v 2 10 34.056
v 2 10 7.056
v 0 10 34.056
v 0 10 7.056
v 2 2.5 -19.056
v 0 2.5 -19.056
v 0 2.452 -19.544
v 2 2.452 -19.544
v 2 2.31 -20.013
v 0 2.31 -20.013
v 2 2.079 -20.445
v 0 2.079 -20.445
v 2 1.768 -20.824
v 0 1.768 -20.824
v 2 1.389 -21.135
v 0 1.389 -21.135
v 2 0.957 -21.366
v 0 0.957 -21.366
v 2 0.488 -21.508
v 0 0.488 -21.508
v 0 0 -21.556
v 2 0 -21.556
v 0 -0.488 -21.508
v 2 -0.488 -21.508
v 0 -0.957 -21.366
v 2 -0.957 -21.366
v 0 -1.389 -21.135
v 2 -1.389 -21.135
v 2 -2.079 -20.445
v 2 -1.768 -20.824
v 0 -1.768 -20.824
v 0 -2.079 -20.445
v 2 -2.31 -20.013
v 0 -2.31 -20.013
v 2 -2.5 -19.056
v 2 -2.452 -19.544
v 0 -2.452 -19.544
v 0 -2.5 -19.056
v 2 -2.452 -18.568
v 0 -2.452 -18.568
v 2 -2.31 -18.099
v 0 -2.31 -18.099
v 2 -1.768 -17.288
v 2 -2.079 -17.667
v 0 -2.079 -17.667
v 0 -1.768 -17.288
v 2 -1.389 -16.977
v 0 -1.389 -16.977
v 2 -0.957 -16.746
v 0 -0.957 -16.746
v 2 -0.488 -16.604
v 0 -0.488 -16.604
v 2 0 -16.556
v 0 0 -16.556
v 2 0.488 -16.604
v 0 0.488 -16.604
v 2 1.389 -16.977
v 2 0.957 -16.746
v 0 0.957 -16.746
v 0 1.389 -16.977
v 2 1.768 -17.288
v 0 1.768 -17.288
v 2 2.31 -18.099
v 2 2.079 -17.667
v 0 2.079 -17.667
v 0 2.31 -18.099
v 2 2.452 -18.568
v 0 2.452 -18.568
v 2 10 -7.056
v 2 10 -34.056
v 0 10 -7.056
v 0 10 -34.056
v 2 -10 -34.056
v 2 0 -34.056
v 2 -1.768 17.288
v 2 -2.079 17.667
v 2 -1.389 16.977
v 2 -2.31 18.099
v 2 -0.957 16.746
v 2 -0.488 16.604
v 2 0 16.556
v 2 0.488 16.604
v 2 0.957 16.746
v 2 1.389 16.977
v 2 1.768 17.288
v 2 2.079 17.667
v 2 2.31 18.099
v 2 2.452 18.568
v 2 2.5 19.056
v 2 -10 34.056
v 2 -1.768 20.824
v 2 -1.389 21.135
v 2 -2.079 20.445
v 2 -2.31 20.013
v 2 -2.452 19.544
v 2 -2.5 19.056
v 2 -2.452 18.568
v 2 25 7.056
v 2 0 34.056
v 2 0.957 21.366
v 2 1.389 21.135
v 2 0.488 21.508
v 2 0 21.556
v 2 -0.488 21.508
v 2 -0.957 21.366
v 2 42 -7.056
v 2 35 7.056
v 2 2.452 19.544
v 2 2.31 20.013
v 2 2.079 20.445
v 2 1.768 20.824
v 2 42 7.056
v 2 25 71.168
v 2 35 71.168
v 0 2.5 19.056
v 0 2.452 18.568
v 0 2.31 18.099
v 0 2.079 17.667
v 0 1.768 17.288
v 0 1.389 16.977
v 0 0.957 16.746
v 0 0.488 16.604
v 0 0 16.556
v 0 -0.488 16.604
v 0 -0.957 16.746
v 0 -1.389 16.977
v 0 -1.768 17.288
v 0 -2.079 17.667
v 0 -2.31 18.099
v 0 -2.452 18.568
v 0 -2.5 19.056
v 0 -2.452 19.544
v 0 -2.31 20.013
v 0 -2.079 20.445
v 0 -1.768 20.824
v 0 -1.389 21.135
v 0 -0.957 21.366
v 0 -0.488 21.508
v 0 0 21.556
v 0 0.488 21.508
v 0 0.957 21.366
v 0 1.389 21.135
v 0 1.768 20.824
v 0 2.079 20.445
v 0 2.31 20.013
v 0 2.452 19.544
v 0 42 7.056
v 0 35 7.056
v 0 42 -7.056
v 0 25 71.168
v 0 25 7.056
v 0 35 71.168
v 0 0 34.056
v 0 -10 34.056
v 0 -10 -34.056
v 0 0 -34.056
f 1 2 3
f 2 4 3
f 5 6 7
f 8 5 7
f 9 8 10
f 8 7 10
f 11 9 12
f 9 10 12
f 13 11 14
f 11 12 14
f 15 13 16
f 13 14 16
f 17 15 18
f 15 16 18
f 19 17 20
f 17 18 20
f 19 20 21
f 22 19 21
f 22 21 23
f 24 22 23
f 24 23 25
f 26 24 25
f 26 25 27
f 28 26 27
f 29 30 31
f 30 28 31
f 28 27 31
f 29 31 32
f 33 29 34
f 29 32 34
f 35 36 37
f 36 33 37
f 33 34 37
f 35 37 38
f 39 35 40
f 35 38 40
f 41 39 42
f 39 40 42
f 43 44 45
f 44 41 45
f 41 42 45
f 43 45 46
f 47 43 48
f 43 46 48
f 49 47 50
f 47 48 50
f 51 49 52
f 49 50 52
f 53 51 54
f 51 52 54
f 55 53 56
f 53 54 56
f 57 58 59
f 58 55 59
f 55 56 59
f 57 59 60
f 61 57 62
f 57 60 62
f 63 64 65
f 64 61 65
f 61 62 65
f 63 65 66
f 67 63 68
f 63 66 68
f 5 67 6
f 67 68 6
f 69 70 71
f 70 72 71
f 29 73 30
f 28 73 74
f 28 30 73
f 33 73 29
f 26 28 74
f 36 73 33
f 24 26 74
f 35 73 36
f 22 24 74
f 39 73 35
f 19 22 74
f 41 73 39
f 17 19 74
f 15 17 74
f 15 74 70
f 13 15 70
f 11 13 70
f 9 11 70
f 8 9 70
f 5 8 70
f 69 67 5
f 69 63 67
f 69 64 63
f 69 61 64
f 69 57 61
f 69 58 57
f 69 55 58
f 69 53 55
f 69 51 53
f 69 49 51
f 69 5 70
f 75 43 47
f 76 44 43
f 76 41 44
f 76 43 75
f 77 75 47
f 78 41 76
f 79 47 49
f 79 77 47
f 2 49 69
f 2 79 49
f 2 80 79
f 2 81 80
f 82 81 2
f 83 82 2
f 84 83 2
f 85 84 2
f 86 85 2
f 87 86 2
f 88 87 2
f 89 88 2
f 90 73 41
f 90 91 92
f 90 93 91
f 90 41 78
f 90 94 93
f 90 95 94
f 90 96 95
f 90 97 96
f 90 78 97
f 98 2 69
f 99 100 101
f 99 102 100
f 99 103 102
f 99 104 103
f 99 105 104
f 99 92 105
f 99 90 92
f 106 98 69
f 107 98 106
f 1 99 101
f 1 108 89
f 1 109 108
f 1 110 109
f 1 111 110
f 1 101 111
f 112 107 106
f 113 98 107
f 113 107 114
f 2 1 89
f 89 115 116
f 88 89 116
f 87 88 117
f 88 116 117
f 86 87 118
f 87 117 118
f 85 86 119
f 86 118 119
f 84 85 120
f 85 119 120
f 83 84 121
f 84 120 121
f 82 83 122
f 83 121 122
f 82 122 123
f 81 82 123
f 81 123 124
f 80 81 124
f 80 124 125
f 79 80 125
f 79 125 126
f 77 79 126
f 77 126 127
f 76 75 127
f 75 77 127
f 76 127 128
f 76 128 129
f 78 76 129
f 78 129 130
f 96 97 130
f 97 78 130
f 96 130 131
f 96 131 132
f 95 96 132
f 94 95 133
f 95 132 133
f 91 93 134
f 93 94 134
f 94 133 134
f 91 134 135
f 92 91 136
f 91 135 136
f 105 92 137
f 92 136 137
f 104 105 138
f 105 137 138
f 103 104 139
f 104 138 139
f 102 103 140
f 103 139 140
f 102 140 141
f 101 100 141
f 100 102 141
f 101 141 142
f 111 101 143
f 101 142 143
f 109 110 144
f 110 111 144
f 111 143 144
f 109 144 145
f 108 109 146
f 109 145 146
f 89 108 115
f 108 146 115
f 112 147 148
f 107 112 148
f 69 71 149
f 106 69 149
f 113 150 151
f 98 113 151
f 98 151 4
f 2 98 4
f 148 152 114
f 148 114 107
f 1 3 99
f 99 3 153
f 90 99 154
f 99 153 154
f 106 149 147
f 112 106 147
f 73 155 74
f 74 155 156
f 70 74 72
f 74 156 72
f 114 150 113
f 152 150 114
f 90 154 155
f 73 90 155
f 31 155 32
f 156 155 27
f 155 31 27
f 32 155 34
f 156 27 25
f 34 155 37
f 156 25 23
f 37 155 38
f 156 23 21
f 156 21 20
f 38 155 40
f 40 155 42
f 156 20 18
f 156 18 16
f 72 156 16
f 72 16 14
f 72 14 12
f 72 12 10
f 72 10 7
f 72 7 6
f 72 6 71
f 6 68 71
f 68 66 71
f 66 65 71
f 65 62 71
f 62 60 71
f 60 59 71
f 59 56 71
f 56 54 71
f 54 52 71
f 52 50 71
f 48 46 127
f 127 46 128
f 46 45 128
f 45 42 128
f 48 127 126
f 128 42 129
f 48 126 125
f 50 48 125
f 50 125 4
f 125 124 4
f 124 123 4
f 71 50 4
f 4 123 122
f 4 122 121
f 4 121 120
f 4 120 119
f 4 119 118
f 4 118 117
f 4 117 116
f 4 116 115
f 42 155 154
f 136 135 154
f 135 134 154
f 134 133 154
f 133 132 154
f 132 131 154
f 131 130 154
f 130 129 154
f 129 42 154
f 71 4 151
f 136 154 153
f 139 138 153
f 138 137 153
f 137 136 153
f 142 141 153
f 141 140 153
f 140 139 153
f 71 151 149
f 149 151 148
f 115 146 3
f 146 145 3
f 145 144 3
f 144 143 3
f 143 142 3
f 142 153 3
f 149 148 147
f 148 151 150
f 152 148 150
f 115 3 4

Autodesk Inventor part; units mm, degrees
ref_plane "YZ Plane" through (0, 0, 0) normal (1, 0, 0) x (0, 1, 0)
ref_plane "XZ Plane" through (0, 0, 0) normal (0, 1, 0) x (-1, 0, 0)
ref_plane "XY Plane" through (0, 0, 0) normal (0, 0, 1) x (1, 0, 0)
sketch "Sketch1" plane through (0, 0, 0) normal (1, 0, 0) x (0, 1, 0)
  line L0 (10, 34.056) -> (-10, 34.056)
  line L1 (-10, 34.056) -> (-10, -34.056)
  line L2 (-10, -34.056) -> (10, -34.056)
  line L3 (10, -34.056) -> (10, 34.056)
  line L4 (10, 34.056) -> (-10, -34.056) construction
  line L5 (-10, 34.056) -> (10, -34.056) construction
  line L6 (10, 0) -> (10, -7.056)
  line L7 (10, -7.056) -> (42, -7.056)
  line L8 (42, -7.056) -> (42, 7.056)
  line L9 (42, 7.056) -> (10, 7.056)
  line L10 (10, 7.056) -> (10, -7.056)
  line L11 (0, 34.056) -> (0, 19.056)
  line L12 (0, -34.056) -> (0, -19.056)
  circle A0 centre (0, 19.056) radius 2.5
  circle A1 centre (0, -19.056) radius 2.5
  line L13 (10, 7.056) -> (10, 34.056)
  line L14 (10, 7.056) -> (10, 19.9232)
  line L15 (10, 19.9232) -> (25, 19.9232)
  line L16 (25, 19.9232) -> (25, 7.056)
  line L17 (25, 7.056) -> (10, 7.056)
  line L18 (25, 7.056) -> (25, 71.168)
  line L19 (25, 71.168) -> (35, 71.168)
  line L20 (35, 71.168) -> (35, 7.056)
  line L21 (35, 7.056) -> (25, 7.056)
  line L22 (35, 7.056) -> (35, 27.056)
  line L23 (35, 27.056) -> (25, 27.056)
  line L24 (35, 71.168) -> (35, 57.168)
  line L25 (35, 57.168) -> (25, 57.168)
  point P0 (0, 0)
  point P1 (0, 0)
  dimension "d0" = 20
  dimension "d1" = 68.112
  dimension "d2" = 7.056
  dimension "d3" = 32
  dimension "d4" = 14.112
  dimension "d5" = 15
  dimension "d6" = 15
  dimension "d7" = 5
  dimension "d8" = 5
  dimension "d9" = 15
  dimension "d10" = 64.112
  dimension "d11" = 10
  dimension "d12" = 20
  dimension "d13" = 14
extrude "Extrusion1" add sketch "Sketch1" along normal blind 2 contours L3 L2 L1 L0 | L9 L8 L7 L3 | L18 L23 L20 L9 L16 | L18 L25 L20 L23 | L18 L19 L20 L25
properties part number "manual_locker_raw"
